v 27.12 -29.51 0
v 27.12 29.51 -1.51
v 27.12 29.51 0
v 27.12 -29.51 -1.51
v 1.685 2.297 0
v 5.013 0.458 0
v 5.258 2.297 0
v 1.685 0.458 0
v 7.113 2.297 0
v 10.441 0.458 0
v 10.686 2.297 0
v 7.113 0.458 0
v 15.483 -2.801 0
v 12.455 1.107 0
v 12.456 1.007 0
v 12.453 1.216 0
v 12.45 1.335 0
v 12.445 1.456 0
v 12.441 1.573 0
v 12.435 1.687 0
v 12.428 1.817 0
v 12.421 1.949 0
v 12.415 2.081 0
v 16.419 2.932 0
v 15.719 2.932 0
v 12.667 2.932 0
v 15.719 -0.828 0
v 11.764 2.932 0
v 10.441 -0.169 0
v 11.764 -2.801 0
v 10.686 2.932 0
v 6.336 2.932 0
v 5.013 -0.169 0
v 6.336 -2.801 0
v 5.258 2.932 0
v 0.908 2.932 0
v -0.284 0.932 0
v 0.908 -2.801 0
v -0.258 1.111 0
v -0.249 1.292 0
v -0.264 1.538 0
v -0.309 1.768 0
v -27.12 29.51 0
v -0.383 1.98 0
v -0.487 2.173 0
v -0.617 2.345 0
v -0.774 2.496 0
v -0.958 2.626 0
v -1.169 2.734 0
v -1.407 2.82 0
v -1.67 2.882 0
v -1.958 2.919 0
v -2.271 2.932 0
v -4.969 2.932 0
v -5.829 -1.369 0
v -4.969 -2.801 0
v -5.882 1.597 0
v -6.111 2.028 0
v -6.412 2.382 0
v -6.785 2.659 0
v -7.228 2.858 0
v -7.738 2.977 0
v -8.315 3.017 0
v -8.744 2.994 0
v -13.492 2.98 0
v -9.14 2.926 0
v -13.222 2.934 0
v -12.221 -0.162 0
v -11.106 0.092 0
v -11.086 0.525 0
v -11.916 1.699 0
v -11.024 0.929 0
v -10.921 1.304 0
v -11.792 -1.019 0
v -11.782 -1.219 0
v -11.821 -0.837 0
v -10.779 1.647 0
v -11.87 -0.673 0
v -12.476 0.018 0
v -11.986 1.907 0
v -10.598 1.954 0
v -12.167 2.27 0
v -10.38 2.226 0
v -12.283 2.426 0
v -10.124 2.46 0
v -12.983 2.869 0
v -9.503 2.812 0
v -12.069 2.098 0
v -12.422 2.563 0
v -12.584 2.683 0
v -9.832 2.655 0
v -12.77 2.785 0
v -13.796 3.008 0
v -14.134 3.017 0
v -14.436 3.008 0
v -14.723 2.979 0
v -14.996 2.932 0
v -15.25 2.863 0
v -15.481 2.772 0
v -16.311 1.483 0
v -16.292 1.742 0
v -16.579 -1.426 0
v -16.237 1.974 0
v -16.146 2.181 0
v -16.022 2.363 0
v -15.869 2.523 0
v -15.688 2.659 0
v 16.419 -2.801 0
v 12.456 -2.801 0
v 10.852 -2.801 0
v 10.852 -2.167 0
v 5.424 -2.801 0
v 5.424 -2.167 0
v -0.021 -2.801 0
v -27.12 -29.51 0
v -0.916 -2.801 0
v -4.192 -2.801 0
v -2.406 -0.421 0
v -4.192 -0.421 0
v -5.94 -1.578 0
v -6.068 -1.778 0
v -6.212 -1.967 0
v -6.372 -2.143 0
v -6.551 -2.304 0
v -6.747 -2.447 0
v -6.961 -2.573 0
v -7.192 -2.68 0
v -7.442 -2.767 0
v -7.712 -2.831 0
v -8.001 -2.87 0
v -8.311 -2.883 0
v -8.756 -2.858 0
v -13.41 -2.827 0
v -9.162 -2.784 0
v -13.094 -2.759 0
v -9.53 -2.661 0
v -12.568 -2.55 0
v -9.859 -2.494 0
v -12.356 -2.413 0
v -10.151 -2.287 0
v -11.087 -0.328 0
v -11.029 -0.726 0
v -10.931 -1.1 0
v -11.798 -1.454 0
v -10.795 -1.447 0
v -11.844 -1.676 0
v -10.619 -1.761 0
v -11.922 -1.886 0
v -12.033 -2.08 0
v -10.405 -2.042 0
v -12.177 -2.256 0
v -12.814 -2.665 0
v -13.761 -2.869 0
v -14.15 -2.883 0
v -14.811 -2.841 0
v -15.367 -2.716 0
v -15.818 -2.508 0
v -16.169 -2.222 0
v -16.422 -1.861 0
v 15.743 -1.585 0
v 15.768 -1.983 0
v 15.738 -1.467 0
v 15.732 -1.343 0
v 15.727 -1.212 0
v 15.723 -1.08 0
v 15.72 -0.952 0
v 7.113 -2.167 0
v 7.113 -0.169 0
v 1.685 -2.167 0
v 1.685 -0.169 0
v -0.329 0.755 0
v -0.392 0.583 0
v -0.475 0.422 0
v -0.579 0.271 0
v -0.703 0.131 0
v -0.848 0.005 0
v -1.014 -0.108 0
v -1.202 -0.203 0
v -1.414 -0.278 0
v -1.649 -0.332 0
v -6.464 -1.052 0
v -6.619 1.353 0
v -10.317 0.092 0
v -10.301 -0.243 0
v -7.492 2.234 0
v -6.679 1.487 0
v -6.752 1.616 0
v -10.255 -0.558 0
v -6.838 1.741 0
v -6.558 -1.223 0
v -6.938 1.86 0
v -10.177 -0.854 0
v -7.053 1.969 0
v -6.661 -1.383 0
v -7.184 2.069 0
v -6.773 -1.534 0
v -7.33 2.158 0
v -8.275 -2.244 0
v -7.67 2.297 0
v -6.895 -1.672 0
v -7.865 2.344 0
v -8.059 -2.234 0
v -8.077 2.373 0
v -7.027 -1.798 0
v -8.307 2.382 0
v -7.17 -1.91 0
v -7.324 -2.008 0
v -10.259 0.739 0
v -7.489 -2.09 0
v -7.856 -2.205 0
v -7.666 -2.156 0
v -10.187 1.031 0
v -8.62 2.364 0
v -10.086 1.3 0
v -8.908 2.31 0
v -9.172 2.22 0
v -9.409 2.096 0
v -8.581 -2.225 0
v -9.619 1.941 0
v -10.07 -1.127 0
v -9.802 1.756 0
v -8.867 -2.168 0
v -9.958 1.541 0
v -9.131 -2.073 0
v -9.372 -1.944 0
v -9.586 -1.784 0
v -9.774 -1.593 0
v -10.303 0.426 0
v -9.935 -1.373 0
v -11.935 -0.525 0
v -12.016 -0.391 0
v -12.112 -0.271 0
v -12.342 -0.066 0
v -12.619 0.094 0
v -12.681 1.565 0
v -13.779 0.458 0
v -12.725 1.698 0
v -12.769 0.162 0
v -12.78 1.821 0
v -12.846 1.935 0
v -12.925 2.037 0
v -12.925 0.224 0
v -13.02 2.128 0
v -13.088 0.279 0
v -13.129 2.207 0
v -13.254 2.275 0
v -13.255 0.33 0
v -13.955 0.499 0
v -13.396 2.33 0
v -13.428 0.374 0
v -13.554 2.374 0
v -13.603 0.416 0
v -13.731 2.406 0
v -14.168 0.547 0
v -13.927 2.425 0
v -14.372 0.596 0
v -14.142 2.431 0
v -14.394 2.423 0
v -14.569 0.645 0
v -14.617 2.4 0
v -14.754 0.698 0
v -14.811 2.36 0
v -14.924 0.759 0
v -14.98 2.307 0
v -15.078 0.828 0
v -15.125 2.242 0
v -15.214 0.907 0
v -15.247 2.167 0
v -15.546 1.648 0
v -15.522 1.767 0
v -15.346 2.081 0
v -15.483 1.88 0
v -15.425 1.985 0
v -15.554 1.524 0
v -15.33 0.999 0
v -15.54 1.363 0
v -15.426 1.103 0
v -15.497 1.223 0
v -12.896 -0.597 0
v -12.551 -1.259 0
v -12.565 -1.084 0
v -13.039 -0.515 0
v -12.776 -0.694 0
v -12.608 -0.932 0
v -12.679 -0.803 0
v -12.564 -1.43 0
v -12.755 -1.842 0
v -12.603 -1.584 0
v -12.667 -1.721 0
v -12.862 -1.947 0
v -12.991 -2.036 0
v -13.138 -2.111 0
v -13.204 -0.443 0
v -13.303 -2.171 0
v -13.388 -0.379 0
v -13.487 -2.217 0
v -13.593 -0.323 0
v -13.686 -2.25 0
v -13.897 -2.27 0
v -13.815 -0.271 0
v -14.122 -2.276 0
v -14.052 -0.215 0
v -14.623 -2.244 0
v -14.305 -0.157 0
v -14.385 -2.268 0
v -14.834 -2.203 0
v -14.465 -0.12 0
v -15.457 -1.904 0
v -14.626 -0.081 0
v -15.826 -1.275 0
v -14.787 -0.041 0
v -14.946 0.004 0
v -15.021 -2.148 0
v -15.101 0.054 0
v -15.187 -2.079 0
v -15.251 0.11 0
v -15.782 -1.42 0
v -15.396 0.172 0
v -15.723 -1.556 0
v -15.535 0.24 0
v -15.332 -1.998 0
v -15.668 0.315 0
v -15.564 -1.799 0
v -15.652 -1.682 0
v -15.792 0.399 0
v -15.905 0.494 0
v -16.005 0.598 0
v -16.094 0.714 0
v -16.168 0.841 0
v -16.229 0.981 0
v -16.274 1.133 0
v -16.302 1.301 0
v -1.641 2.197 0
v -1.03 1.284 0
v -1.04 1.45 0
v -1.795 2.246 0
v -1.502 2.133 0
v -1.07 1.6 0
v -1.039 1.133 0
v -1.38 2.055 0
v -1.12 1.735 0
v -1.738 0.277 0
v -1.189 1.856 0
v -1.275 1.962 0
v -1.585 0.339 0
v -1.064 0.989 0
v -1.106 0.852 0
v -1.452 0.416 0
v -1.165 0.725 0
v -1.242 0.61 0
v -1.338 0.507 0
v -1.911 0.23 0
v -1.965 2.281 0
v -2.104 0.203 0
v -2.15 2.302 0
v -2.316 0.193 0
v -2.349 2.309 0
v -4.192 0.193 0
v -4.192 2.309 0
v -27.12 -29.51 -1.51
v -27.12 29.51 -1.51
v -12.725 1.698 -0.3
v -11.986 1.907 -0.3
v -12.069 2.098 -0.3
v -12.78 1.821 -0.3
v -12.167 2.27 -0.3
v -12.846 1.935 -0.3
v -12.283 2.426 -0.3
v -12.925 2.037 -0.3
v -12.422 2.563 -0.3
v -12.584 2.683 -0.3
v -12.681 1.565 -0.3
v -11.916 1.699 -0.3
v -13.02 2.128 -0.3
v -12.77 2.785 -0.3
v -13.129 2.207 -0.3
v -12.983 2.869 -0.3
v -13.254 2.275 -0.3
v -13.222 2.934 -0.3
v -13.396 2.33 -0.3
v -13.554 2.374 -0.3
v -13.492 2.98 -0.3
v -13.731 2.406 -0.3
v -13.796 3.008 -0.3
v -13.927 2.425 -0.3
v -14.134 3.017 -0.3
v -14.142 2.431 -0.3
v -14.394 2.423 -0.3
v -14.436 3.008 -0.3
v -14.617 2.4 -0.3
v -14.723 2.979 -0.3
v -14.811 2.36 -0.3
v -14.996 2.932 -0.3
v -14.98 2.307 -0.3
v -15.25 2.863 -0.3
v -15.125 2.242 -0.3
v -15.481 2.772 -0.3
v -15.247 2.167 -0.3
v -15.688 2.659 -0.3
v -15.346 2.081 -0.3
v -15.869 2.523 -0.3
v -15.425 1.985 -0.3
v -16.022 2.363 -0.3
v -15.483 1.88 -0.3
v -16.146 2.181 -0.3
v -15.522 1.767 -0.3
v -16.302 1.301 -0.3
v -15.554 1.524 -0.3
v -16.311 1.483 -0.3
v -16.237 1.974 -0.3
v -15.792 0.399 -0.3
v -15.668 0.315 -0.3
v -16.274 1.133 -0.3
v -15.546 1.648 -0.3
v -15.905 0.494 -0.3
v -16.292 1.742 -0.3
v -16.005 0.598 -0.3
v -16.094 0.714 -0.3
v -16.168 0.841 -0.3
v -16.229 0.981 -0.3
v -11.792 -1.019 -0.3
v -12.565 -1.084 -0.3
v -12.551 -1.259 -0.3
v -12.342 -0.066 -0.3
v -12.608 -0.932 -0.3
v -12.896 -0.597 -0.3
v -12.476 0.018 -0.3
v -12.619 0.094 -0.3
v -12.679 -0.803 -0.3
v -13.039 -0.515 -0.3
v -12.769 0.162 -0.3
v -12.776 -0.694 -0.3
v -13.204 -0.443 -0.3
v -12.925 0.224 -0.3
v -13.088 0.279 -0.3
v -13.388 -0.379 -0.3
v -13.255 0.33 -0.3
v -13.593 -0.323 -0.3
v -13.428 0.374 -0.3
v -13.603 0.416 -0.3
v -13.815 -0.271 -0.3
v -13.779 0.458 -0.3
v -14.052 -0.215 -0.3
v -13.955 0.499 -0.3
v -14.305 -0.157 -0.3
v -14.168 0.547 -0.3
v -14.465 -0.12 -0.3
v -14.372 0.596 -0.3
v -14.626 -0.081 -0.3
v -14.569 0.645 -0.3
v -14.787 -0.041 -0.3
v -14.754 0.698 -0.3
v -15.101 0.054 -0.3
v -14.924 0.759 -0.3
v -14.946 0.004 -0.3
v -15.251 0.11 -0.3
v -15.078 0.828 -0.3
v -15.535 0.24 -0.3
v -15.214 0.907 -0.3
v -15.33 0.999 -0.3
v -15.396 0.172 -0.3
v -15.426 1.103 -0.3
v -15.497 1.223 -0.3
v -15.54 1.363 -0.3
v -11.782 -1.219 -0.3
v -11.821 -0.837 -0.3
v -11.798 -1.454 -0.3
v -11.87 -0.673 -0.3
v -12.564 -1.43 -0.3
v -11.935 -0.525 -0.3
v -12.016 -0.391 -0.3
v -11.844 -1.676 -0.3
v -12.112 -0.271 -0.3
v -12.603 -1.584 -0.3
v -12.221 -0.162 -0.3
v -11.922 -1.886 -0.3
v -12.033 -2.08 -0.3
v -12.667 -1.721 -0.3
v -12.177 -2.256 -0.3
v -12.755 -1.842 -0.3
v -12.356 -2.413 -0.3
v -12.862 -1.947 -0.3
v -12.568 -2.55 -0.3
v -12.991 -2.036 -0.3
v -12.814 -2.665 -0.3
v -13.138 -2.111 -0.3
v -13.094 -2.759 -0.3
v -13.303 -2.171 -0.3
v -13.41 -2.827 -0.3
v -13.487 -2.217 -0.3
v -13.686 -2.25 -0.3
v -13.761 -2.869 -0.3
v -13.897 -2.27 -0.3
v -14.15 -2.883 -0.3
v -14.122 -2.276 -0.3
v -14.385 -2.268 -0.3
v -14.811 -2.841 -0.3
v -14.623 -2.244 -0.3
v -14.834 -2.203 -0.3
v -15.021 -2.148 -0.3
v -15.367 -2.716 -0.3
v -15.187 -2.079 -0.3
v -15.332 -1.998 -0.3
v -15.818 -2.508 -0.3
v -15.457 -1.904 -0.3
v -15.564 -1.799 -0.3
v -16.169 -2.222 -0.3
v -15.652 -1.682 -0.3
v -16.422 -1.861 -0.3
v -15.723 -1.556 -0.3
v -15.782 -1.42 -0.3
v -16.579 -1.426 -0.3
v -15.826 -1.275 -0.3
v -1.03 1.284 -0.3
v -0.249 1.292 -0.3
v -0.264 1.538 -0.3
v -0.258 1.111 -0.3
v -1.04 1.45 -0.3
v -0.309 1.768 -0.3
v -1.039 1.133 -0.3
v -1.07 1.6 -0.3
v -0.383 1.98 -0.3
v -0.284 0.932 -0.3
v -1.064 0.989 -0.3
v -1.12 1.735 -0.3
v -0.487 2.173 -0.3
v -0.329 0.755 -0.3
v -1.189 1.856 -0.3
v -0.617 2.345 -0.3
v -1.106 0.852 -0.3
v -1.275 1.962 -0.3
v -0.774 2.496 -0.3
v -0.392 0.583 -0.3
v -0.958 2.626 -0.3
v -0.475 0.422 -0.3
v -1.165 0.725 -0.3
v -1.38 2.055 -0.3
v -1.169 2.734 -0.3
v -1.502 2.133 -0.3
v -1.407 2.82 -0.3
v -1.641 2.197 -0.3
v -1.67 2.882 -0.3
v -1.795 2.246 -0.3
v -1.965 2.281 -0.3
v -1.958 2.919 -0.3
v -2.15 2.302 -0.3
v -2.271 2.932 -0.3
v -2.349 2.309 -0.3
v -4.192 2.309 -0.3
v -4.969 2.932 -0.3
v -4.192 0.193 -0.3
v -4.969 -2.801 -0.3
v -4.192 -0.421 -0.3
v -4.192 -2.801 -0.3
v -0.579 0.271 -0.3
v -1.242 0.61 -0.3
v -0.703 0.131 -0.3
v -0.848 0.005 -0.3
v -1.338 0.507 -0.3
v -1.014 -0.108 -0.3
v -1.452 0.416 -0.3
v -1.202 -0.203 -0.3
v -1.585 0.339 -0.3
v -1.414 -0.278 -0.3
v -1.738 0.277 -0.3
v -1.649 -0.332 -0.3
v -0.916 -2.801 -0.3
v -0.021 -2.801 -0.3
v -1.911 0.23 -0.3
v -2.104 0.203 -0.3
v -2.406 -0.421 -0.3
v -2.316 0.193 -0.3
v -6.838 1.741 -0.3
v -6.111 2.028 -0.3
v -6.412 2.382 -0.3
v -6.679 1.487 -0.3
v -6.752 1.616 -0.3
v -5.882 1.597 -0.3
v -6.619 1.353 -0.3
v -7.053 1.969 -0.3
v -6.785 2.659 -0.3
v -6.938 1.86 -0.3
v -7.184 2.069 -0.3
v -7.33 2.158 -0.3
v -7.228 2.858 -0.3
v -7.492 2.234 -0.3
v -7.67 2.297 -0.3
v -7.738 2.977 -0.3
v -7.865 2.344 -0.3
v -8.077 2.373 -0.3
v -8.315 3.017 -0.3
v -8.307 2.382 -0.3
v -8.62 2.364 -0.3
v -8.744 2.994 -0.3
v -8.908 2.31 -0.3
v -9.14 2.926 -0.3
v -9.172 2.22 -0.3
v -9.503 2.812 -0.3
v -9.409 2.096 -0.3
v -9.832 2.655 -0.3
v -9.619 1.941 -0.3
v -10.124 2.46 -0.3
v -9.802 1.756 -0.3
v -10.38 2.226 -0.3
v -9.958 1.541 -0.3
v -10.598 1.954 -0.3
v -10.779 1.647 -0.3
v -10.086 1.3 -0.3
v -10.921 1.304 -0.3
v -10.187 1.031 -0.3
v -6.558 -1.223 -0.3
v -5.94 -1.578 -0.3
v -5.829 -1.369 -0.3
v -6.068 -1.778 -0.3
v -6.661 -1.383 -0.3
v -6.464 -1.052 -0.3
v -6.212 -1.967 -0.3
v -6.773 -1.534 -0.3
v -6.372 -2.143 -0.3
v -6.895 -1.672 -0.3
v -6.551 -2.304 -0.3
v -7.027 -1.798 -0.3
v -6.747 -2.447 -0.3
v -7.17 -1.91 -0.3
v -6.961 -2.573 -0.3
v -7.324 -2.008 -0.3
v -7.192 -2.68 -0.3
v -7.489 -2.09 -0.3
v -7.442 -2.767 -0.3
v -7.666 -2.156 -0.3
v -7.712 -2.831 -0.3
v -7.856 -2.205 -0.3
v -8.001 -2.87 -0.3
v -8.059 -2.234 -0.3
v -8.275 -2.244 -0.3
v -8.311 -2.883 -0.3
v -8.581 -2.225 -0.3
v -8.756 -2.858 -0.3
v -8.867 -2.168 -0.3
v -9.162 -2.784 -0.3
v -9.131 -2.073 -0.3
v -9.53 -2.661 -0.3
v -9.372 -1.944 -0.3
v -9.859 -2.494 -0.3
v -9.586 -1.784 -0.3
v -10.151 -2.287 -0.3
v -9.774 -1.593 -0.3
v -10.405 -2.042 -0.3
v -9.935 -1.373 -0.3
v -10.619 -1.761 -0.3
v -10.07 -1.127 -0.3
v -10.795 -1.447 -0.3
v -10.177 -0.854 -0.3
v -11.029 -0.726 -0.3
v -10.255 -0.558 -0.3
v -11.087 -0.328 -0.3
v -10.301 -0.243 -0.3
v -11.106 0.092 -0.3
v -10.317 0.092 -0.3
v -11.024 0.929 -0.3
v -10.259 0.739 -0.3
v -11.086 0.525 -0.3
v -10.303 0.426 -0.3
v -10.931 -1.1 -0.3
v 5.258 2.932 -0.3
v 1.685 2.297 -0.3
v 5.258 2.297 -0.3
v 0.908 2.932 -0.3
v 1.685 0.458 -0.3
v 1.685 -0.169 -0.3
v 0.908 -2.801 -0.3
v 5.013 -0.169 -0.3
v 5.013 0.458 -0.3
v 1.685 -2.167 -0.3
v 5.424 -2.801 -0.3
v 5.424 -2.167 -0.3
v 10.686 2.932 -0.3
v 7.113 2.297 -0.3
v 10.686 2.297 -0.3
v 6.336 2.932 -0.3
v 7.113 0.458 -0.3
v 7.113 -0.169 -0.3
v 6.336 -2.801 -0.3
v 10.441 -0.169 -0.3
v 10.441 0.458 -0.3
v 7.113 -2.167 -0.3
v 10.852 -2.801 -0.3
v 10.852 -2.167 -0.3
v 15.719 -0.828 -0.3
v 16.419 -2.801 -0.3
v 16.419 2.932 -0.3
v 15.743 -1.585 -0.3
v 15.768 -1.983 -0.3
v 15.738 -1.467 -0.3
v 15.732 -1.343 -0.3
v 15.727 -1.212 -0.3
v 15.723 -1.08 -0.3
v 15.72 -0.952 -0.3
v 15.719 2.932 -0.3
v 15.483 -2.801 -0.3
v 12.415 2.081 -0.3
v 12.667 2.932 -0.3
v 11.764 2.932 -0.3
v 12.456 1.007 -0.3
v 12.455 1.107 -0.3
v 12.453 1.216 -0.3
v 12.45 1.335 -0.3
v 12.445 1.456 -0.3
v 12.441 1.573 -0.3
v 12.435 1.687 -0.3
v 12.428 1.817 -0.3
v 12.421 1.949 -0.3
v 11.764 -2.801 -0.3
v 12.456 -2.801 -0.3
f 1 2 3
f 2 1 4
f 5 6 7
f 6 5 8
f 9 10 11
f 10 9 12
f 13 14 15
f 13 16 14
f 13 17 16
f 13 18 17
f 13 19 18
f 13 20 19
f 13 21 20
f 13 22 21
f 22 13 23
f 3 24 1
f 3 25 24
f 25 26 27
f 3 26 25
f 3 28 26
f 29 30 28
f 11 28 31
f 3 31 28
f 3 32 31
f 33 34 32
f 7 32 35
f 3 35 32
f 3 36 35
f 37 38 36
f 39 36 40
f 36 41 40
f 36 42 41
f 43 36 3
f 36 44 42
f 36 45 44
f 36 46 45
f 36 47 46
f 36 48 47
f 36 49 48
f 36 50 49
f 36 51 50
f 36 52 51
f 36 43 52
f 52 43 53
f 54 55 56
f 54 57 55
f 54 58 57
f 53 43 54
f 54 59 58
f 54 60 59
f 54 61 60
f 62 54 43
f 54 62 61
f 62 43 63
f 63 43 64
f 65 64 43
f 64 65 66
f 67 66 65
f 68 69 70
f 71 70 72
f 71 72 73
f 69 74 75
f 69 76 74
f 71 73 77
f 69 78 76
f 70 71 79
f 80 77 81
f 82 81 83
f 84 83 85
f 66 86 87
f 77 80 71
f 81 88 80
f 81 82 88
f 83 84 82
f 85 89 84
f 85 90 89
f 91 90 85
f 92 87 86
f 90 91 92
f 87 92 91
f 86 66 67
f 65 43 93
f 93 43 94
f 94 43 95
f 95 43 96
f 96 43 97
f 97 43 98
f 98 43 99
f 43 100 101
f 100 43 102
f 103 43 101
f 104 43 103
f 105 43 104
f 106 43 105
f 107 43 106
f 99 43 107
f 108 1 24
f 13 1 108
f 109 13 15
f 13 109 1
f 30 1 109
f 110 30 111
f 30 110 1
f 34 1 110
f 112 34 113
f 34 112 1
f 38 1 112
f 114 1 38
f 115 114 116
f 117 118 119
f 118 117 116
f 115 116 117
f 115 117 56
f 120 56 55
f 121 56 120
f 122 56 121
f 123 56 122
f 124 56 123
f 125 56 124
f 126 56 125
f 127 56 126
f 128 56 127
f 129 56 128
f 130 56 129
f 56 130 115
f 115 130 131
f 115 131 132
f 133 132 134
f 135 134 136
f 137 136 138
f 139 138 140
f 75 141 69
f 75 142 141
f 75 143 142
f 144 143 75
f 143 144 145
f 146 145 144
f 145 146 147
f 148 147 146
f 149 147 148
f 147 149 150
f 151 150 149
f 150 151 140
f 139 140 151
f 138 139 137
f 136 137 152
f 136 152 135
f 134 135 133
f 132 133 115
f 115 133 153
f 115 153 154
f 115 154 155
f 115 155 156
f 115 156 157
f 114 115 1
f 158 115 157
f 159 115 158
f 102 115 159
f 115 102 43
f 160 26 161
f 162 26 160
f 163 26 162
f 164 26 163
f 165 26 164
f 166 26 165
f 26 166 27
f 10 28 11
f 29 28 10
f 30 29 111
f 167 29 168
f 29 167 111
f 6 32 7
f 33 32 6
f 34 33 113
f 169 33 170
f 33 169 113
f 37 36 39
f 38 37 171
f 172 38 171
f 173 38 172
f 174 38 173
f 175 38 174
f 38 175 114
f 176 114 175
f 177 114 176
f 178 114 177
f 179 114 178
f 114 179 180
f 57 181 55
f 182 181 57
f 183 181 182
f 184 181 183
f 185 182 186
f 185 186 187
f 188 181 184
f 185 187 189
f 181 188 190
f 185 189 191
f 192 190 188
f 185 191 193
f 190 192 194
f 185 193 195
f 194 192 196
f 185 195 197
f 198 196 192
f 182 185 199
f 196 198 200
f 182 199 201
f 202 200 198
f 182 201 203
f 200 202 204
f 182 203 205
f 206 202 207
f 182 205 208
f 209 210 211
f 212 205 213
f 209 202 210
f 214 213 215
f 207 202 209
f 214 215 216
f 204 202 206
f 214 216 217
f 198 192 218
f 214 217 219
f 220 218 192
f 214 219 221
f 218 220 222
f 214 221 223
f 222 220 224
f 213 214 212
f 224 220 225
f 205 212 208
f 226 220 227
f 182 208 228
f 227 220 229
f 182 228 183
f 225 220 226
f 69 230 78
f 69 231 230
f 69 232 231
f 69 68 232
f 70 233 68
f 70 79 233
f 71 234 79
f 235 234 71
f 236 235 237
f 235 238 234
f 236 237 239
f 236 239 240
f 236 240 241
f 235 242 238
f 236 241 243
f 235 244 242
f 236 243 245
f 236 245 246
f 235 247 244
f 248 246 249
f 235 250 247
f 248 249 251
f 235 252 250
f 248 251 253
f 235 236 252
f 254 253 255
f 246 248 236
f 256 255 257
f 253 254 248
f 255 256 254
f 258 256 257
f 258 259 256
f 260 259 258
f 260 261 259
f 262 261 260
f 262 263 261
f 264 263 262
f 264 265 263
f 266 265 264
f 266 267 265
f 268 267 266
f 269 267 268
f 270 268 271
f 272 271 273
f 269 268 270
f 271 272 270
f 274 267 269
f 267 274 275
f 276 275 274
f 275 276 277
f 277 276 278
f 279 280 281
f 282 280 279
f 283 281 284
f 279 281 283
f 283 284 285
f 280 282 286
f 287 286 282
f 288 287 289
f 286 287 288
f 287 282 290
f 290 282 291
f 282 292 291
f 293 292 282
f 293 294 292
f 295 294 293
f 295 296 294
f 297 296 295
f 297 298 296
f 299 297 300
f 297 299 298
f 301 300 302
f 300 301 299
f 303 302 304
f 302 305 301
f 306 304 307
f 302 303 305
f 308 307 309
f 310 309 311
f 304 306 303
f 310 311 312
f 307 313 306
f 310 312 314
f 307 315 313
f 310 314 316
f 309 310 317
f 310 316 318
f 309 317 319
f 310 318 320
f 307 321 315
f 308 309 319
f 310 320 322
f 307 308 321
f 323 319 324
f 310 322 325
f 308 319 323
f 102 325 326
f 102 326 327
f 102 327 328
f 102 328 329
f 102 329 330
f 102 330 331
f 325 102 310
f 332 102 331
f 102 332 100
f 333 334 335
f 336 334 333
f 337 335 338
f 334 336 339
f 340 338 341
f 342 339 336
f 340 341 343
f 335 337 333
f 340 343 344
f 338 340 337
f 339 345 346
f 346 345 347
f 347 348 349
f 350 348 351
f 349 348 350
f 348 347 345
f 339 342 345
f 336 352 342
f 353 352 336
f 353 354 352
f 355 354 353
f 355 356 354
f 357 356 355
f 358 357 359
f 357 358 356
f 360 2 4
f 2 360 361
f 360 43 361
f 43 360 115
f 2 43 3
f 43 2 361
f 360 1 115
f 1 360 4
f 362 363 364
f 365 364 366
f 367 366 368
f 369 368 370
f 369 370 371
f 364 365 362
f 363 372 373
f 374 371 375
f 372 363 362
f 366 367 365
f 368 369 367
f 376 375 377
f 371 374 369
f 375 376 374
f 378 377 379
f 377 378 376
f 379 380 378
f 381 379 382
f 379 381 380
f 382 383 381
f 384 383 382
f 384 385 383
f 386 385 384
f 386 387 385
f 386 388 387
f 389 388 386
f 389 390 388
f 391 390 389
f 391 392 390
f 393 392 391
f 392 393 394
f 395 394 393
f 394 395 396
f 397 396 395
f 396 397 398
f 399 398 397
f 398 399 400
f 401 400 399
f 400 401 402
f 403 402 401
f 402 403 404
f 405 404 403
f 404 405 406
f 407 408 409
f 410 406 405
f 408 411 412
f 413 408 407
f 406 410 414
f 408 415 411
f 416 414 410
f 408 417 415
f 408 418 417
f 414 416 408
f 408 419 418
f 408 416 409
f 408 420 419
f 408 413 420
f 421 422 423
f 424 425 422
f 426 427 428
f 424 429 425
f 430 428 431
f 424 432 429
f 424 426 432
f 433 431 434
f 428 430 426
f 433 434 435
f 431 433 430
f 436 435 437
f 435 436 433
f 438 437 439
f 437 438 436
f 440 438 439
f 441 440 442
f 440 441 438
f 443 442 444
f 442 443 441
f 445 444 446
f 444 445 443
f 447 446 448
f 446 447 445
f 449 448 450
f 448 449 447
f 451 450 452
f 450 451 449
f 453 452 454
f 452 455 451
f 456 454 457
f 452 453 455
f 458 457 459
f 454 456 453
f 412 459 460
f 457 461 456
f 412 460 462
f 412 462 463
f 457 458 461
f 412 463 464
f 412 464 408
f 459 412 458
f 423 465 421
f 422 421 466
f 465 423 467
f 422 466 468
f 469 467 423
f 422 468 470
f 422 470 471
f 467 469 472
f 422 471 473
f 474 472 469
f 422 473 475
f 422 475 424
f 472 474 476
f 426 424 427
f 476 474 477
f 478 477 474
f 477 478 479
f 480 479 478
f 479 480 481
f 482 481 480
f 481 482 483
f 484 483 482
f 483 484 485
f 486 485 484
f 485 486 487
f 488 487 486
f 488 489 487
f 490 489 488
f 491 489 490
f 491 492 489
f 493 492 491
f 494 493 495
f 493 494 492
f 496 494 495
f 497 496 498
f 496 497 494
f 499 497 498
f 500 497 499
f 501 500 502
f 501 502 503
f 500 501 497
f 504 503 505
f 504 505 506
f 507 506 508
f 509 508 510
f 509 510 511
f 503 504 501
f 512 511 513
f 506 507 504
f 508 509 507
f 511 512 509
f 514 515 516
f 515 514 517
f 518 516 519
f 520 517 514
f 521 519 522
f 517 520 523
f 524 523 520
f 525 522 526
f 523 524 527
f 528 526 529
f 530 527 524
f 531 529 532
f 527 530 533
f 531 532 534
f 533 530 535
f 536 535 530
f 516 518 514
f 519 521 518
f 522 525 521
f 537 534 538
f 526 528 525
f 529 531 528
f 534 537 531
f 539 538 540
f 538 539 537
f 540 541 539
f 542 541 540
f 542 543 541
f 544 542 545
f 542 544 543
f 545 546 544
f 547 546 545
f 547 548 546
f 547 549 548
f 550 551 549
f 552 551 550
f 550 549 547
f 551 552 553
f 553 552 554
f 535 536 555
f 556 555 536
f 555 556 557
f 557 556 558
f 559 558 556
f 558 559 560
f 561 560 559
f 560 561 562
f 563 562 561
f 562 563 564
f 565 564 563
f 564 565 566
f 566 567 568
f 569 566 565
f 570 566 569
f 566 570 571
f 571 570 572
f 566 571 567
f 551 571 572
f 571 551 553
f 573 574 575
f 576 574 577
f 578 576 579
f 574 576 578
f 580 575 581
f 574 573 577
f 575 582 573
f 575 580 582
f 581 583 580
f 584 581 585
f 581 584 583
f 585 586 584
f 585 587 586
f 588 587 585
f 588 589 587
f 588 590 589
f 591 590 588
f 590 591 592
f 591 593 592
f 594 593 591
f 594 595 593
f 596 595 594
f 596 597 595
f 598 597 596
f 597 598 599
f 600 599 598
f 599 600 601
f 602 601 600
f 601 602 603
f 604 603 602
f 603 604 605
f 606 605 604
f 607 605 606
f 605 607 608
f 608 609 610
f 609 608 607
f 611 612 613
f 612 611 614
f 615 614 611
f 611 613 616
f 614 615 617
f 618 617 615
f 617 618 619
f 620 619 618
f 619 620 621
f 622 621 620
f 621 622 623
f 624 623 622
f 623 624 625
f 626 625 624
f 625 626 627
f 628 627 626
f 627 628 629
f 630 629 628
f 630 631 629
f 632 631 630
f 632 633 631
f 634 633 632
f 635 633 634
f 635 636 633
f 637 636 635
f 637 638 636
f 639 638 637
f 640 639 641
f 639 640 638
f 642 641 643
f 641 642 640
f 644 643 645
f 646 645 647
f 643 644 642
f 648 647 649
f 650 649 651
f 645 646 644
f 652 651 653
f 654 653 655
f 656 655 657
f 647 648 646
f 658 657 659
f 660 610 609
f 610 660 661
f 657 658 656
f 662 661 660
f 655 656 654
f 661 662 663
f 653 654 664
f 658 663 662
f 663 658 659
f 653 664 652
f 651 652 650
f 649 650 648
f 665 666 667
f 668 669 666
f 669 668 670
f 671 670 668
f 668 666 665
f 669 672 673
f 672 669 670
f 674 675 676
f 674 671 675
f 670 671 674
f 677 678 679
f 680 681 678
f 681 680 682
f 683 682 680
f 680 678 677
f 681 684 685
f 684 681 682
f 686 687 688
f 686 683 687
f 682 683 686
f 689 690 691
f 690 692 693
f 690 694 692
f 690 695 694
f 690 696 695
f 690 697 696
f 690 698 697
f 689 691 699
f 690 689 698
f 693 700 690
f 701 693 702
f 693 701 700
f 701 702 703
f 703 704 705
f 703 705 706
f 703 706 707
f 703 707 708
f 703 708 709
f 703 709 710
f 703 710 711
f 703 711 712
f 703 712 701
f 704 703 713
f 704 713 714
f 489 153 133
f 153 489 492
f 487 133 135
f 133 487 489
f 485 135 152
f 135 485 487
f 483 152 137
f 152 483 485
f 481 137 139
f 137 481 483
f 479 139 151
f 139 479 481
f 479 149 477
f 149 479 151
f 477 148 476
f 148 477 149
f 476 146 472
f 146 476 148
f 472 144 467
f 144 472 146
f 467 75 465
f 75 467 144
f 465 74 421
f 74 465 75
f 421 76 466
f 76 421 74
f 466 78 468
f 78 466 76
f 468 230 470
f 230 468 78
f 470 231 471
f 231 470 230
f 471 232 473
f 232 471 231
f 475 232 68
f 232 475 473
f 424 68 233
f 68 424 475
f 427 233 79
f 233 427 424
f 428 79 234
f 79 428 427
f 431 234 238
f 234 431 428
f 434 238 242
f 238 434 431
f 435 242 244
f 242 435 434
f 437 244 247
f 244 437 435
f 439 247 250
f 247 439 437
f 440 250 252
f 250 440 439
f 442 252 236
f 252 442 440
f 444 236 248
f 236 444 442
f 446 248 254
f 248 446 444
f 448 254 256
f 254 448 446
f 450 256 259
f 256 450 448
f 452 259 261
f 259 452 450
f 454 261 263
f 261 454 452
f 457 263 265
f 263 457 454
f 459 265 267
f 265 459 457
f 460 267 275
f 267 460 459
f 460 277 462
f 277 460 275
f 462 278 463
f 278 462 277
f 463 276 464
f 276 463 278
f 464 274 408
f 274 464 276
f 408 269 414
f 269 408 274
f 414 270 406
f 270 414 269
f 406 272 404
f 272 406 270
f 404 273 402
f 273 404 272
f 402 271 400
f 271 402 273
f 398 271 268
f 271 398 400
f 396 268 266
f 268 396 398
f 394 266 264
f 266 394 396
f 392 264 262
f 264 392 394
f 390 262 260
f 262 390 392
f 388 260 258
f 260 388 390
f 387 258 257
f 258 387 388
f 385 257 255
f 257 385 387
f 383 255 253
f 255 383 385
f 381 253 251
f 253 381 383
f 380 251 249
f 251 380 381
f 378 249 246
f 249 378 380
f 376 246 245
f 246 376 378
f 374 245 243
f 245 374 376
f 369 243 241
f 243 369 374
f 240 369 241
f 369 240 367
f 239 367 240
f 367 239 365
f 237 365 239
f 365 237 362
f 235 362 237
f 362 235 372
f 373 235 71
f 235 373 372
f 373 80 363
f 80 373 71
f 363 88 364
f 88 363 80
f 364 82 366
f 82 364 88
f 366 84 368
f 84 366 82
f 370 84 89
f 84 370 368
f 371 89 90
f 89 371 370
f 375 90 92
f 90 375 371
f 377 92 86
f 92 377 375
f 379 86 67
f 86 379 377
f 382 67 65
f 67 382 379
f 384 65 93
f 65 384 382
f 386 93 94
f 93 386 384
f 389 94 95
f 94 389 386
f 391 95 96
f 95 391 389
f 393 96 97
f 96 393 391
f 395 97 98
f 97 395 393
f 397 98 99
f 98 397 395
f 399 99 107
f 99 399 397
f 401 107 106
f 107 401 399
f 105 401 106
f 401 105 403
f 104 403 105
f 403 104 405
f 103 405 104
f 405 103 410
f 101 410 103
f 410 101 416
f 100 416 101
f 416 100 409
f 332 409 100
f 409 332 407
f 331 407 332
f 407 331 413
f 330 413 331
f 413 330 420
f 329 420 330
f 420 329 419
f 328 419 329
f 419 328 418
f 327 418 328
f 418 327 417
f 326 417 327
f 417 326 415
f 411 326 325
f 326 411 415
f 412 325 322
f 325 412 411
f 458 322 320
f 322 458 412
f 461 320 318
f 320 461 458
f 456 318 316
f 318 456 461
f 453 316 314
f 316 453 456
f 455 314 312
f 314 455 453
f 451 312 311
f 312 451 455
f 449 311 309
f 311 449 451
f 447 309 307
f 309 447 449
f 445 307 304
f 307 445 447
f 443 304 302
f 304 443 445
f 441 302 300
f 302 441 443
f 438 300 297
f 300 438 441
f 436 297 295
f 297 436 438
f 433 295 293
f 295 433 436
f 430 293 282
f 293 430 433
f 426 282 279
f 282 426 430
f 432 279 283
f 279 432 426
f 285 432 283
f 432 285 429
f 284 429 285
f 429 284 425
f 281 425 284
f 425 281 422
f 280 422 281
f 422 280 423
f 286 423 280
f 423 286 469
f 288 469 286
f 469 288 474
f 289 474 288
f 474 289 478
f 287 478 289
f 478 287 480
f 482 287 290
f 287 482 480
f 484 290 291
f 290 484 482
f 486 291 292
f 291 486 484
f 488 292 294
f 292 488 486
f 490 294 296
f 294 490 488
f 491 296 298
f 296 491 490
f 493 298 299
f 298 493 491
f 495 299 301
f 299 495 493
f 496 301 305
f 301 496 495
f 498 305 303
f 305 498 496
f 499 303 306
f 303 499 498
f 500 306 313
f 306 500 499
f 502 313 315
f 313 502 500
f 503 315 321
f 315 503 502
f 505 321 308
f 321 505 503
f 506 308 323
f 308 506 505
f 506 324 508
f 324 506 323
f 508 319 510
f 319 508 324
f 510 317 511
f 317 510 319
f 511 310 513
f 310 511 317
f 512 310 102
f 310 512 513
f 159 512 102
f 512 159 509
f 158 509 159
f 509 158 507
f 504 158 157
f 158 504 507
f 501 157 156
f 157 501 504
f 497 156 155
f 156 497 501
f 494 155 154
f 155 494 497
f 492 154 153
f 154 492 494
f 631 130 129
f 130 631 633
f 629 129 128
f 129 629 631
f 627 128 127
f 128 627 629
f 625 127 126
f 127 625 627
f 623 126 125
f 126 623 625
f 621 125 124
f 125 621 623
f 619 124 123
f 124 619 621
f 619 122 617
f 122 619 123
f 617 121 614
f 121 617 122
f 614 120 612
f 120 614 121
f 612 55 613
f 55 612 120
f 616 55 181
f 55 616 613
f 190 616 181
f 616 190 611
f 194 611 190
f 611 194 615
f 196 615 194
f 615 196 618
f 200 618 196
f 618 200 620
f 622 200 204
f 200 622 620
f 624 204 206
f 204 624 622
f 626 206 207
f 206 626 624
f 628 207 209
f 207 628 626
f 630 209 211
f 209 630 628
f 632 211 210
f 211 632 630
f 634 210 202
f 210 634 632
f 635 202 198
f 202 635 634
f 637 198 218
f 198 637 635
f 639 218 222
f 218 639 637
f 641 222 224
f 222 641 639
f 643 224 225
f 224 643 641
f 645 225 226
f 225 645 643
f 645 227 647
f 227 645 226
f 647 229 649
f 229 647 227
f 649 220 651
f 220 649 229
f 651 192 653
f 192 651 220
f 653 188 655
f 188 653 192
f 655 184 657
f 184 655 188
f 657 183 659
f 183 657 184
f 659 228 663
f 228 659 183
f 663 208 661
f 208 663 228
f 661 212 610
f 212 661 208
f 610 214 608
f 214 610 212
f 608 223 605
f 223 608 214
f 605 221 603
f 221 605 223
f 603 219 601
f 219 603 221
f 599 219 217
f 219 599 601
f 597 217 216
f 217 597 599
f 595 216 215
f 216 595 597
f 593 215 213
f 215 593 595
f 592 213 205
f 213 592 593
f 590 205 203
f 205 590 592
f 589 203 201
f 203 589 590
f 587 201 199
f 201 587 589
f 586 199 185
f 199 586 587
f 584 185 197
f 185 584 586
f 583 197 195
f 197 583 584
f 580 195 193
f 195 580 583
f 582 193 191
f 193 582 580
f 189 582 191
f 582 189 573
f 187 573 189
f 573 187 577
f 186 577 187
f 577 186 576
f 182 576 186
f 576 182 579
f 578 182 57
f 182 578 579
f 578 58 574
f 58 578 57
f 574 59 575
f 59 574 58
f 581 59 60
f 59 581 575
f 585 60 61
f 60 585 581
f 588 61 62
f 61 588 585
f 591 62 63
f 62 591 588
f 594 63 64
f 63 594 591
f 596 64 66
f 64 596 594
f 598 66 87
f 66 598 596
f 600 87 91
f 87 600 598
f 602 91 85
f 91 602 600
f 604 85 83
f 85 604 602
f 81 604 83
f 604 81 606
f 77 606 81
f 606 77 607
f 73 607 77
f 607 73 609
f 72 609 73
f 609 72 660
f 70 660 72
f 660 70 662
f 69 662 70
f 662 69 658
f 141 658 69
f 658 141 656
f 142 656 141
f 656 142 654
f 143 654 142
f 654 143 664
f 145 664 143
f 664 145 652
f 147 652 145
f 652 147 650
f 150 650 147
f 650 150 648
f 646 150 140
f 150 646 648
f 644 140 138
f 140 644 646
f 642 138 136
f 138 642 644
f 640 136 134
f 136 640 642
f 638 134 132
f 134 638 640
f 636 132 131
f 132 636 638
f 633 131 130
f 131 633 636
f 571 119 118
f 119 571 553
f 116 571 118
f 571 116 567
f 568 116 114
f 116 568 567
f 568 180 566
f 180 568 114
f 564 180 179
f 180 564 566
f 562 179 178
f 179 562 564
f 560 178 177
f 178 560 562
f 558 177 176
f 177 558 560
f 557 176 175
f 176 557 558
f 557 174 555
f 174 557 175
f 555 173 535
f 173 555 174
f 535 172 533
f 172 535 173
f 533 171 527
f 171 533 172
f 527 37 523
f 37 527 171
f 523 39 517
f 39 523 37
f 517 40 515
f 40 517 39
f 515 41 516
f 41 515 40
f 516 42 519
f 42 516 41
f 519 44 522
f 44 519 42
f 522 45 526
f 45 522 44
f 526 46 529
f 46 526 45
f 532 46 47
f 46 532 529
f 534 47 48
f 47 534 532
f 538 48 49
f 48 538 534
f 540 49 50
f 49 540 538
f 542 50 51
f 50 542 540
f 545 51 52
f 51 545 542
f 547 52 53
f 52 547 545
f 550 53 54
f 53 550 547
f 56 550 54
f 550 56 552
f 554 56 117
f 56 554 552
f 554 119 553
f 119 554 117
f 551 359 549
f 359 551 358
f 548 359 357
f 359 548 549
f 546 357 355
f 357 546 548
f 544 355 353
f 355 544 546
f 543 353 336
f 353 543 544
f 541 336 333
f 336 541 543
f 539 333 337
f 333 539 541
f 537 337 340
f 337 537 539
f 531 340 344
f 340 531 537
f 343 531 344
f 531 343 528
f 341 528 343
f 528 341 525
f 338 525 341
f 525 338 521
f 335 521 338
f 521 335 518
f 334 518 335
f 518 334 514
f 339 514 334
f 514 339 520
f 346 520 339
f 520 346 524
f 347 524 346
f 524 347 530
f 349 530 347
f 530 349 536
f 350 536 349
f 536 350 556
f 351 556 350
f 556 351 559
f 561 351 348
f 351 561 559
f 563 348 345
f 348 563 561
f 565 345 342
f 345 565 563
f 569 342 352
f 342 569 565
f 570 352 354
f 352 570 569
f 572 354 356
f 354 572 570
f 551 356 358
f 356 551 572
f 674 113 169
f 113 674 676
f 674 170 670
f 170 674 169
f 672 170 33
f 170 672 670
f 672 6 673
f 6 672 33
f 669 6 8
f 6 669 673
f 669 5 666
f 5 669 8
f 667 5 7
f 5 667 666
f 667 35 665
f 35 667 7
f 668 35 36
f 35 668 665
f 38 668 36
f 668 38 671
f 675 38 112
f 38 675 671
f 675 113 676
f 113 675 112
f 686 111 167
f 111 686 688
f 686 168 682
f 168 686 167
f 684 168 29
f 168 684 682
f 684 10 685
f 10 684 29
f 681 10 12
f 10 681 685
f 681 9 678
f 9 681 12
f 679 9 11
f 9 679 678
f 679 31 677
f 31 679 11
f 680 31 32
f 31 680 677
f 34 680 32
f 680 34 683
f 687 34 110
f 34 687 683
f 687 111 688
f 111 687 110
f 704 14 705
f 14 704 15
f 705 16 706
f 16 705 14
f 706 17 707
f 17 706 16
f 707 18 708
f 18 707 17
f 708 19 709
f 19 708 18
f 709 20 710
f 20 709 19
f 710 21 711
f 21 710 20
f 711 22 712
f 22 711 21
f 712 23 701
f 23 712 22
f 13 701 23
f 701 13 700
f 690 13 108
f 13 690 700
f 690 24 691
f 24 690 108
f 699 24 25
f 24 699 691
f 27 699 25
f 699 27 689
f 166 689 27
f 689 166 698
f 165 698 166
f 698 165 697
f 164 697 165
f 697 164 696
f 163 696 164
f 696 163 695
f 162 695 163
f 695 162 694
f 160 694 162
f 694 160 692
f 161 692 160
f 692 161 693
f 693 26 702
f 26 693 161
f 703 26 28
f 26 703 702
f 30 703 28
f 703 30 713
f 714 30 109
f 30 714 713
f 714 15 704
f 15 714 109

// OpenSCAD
screen_w = 54.24; 
screen_h = 59.02;
screen_d = 1.51;
font_depth = 0.4;

difference() {
    translate([-screen_w/2, -screen_h/2, -screen_d])
        cube([screen_w, screen_h, screen_d]);

    translate([0,0,0.1 - font_depth])
    linear_extrude(font_depth)
    //text("59.24x59.02x1.51mm", halign="center", valign="center", size=4);
    text("SCREEN", halign="center", valign="center", size=6);
}
